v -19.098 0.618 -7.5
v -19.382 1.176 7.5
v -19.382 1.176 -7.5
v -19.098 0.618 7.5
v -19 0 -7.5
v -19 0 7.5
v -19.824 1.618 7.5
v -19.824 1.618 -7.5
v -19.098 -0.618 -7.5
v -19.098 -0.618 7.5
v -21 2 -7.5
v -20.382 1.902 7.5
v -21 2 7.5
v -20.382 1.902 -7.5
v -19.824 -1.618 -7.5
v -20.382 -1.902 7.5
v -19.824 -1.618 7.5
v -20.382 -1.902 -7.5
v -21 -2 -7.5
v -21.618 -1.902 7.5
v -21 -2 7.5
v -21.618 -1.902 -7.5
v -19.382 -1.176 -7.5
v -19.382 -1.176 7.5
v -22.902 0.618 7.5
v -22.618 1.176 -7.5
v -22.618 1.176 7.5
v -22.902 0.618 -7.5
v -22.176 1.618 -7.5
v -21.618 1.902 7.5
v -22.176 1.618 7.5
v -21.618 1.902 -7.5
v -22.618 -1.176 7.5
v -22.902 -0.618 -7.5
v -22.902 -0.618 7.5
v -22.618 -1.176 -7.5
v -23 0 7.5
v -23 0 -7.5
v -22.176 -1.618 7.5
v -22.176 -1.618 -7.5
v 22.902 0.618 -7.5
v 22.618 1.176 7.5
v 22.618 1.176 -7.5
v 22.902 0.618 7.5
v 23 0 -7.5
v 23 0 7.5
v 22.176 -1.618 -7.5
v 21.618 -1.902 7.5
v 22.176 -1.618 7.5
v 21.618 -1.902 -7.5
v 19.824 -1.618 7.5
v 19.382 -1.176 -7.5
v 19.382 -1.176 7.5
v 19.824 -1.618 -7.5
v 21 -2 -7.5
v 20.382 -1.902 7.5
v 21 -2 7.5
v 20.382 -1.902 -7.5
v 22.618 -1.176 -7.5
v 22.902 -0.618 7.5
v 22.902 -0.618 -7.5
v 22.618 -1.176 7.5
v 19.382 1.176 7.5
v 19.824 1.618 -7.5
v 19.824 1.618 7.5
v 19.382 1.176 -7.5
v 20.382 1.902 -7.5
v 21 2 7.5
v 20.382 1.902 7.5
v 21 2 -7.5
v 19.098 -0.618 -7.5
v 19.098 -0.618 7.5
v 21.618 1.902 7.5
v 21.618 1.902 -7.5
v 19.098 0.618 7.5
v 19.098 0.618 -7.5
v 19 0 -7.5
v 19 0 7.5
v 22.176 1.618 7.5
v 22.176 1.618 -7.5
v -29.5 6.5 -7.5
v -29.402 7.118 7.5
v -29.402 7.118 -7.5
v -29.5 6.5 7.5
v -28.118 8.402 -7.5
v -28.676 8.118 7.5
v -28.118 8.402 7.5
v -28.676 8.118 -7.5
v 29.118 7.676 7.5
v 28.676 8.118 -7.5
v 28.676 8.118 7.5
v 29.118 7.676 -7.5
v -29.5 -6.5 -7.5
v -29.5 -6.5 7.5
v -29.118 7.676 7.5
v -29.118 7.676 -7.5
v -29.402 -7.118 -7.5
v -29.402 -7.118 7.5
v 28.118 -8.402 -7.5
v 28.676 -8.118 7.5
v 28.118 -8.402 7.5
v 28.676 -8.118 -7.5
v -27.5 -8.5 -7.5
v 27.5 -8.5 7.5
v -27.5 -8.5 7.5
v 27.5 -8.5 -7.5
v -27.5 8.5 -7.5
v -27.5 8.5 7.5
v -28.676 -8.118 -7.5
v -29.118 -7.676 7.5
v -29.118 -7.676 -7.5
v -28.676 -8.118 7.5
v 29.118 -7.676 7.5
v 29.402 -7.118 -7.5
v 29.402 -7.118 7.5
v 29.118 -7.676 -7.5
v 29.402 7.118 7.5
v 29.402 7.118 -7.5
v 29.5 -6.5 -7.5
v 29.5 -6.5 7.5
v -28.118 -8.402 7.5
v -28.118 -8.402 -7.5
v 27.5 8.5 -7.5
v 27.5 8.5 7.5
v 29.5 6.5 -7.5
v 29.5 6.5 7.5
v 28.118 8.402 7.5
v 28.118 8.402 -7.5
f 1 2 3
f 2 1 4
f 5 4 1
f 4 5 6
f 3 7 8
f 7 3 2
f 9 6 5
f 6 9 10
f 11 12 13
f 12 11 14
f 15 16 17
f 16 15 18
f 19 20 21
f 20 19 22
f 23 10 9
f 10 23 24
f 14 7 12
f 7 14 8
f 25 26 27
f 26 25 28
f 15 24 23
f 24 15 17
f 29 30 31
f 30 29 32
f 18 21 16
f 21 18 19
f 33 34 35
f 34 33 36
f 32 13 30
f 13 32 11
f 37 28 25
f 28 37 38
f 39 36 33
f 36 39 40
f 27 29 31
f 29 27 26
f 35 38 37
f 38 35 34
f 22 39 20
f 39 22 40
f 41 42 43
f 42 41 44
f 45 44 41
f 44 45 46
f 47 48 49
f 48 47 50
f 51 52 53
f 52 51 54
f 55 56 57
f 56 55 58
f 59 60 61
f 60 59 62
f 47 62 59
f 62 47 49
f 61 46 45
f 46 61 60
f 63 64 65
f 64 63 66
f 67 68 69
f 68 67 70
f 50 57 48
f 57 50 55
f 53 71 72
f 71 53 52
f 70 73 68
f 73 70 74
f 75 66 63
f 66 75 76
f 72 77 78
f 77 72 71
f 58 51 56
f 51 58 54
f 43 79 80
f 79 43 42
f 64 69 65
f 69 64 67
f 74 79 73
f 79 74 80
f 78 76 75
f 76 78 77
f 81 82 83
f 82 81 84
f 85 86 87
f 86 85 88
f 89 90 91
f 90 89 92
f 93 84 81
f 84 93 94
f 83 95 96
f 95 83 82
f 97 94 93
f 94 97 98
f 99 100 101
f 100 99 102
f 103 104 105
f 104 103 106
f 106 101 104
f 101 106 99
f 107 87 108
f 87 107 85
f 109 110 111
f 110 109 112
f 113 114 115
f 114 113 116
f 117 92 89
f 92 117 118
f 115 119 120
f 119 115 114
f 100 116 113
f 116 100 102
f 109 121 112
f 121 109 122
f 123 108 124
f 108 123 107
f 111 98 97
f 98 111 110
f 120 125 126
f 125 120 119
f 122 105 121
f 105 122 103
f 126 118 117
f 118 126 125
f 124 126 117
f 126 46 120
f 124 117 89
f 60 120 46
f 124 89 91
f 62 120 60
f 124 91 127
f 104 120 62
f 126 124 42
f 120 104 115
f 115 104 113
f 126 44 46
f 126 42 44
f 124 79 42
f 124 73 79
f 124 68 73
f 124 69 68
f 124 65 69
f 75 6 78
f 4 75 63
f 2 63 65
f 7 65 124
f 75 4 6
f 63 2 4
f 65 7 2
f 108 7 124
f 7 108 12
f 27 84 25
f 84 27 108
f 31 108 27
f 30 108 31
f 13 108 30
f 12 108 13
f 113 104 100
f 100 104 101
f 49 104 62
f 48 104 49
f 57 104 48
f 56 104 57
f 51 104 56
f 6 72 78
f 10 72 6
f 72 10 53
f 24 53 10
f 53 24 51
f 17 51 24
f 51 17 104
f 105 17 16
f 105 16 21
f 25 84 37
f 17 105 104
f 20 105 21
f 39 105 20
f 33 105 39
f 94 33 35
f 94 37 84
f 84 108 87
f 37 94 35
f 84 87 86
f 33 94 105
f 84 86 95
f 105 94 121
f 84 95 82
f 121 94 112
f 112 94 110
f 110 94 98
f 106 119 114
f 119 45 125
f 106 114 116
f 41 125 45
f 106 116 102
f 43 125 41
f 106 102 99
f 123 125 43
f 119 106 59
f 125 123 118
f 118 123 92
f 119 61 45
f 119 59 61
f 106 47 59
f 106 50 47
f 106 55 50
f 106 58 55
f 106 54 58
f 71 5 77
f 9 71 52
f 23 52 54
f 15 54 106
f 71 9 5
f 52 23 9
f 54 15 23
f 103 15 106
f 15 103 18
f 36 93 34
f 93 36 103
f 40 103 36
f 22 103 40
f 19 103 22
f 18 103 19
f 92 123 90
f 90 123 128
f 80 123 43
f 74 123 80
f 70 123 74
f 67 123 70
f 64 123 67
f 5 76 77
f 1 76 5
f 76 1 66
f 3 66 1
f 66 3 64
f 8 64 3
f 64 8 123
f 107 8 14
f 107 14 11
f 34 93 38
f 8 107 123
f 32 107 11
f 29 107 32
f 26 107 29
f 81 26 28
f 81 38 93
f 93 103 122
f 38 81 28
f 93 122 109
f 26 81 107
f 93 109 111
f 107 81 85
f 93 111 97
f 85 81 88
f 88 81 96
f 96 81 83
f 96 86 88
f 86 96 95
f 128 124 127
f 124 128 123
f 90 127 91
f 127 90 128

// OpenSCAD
H=15;

$fn=20;
difference() {
    translate([0,0,-H/2]) linear_extrude(H) minkowski() {
        square([55,13], center=true);
        circle(2);
    }
    for (i = [-1,1]) {
        translate([i*21,0,0])
            cylinder(d=4,h=H+2,center=true);
    }
}
